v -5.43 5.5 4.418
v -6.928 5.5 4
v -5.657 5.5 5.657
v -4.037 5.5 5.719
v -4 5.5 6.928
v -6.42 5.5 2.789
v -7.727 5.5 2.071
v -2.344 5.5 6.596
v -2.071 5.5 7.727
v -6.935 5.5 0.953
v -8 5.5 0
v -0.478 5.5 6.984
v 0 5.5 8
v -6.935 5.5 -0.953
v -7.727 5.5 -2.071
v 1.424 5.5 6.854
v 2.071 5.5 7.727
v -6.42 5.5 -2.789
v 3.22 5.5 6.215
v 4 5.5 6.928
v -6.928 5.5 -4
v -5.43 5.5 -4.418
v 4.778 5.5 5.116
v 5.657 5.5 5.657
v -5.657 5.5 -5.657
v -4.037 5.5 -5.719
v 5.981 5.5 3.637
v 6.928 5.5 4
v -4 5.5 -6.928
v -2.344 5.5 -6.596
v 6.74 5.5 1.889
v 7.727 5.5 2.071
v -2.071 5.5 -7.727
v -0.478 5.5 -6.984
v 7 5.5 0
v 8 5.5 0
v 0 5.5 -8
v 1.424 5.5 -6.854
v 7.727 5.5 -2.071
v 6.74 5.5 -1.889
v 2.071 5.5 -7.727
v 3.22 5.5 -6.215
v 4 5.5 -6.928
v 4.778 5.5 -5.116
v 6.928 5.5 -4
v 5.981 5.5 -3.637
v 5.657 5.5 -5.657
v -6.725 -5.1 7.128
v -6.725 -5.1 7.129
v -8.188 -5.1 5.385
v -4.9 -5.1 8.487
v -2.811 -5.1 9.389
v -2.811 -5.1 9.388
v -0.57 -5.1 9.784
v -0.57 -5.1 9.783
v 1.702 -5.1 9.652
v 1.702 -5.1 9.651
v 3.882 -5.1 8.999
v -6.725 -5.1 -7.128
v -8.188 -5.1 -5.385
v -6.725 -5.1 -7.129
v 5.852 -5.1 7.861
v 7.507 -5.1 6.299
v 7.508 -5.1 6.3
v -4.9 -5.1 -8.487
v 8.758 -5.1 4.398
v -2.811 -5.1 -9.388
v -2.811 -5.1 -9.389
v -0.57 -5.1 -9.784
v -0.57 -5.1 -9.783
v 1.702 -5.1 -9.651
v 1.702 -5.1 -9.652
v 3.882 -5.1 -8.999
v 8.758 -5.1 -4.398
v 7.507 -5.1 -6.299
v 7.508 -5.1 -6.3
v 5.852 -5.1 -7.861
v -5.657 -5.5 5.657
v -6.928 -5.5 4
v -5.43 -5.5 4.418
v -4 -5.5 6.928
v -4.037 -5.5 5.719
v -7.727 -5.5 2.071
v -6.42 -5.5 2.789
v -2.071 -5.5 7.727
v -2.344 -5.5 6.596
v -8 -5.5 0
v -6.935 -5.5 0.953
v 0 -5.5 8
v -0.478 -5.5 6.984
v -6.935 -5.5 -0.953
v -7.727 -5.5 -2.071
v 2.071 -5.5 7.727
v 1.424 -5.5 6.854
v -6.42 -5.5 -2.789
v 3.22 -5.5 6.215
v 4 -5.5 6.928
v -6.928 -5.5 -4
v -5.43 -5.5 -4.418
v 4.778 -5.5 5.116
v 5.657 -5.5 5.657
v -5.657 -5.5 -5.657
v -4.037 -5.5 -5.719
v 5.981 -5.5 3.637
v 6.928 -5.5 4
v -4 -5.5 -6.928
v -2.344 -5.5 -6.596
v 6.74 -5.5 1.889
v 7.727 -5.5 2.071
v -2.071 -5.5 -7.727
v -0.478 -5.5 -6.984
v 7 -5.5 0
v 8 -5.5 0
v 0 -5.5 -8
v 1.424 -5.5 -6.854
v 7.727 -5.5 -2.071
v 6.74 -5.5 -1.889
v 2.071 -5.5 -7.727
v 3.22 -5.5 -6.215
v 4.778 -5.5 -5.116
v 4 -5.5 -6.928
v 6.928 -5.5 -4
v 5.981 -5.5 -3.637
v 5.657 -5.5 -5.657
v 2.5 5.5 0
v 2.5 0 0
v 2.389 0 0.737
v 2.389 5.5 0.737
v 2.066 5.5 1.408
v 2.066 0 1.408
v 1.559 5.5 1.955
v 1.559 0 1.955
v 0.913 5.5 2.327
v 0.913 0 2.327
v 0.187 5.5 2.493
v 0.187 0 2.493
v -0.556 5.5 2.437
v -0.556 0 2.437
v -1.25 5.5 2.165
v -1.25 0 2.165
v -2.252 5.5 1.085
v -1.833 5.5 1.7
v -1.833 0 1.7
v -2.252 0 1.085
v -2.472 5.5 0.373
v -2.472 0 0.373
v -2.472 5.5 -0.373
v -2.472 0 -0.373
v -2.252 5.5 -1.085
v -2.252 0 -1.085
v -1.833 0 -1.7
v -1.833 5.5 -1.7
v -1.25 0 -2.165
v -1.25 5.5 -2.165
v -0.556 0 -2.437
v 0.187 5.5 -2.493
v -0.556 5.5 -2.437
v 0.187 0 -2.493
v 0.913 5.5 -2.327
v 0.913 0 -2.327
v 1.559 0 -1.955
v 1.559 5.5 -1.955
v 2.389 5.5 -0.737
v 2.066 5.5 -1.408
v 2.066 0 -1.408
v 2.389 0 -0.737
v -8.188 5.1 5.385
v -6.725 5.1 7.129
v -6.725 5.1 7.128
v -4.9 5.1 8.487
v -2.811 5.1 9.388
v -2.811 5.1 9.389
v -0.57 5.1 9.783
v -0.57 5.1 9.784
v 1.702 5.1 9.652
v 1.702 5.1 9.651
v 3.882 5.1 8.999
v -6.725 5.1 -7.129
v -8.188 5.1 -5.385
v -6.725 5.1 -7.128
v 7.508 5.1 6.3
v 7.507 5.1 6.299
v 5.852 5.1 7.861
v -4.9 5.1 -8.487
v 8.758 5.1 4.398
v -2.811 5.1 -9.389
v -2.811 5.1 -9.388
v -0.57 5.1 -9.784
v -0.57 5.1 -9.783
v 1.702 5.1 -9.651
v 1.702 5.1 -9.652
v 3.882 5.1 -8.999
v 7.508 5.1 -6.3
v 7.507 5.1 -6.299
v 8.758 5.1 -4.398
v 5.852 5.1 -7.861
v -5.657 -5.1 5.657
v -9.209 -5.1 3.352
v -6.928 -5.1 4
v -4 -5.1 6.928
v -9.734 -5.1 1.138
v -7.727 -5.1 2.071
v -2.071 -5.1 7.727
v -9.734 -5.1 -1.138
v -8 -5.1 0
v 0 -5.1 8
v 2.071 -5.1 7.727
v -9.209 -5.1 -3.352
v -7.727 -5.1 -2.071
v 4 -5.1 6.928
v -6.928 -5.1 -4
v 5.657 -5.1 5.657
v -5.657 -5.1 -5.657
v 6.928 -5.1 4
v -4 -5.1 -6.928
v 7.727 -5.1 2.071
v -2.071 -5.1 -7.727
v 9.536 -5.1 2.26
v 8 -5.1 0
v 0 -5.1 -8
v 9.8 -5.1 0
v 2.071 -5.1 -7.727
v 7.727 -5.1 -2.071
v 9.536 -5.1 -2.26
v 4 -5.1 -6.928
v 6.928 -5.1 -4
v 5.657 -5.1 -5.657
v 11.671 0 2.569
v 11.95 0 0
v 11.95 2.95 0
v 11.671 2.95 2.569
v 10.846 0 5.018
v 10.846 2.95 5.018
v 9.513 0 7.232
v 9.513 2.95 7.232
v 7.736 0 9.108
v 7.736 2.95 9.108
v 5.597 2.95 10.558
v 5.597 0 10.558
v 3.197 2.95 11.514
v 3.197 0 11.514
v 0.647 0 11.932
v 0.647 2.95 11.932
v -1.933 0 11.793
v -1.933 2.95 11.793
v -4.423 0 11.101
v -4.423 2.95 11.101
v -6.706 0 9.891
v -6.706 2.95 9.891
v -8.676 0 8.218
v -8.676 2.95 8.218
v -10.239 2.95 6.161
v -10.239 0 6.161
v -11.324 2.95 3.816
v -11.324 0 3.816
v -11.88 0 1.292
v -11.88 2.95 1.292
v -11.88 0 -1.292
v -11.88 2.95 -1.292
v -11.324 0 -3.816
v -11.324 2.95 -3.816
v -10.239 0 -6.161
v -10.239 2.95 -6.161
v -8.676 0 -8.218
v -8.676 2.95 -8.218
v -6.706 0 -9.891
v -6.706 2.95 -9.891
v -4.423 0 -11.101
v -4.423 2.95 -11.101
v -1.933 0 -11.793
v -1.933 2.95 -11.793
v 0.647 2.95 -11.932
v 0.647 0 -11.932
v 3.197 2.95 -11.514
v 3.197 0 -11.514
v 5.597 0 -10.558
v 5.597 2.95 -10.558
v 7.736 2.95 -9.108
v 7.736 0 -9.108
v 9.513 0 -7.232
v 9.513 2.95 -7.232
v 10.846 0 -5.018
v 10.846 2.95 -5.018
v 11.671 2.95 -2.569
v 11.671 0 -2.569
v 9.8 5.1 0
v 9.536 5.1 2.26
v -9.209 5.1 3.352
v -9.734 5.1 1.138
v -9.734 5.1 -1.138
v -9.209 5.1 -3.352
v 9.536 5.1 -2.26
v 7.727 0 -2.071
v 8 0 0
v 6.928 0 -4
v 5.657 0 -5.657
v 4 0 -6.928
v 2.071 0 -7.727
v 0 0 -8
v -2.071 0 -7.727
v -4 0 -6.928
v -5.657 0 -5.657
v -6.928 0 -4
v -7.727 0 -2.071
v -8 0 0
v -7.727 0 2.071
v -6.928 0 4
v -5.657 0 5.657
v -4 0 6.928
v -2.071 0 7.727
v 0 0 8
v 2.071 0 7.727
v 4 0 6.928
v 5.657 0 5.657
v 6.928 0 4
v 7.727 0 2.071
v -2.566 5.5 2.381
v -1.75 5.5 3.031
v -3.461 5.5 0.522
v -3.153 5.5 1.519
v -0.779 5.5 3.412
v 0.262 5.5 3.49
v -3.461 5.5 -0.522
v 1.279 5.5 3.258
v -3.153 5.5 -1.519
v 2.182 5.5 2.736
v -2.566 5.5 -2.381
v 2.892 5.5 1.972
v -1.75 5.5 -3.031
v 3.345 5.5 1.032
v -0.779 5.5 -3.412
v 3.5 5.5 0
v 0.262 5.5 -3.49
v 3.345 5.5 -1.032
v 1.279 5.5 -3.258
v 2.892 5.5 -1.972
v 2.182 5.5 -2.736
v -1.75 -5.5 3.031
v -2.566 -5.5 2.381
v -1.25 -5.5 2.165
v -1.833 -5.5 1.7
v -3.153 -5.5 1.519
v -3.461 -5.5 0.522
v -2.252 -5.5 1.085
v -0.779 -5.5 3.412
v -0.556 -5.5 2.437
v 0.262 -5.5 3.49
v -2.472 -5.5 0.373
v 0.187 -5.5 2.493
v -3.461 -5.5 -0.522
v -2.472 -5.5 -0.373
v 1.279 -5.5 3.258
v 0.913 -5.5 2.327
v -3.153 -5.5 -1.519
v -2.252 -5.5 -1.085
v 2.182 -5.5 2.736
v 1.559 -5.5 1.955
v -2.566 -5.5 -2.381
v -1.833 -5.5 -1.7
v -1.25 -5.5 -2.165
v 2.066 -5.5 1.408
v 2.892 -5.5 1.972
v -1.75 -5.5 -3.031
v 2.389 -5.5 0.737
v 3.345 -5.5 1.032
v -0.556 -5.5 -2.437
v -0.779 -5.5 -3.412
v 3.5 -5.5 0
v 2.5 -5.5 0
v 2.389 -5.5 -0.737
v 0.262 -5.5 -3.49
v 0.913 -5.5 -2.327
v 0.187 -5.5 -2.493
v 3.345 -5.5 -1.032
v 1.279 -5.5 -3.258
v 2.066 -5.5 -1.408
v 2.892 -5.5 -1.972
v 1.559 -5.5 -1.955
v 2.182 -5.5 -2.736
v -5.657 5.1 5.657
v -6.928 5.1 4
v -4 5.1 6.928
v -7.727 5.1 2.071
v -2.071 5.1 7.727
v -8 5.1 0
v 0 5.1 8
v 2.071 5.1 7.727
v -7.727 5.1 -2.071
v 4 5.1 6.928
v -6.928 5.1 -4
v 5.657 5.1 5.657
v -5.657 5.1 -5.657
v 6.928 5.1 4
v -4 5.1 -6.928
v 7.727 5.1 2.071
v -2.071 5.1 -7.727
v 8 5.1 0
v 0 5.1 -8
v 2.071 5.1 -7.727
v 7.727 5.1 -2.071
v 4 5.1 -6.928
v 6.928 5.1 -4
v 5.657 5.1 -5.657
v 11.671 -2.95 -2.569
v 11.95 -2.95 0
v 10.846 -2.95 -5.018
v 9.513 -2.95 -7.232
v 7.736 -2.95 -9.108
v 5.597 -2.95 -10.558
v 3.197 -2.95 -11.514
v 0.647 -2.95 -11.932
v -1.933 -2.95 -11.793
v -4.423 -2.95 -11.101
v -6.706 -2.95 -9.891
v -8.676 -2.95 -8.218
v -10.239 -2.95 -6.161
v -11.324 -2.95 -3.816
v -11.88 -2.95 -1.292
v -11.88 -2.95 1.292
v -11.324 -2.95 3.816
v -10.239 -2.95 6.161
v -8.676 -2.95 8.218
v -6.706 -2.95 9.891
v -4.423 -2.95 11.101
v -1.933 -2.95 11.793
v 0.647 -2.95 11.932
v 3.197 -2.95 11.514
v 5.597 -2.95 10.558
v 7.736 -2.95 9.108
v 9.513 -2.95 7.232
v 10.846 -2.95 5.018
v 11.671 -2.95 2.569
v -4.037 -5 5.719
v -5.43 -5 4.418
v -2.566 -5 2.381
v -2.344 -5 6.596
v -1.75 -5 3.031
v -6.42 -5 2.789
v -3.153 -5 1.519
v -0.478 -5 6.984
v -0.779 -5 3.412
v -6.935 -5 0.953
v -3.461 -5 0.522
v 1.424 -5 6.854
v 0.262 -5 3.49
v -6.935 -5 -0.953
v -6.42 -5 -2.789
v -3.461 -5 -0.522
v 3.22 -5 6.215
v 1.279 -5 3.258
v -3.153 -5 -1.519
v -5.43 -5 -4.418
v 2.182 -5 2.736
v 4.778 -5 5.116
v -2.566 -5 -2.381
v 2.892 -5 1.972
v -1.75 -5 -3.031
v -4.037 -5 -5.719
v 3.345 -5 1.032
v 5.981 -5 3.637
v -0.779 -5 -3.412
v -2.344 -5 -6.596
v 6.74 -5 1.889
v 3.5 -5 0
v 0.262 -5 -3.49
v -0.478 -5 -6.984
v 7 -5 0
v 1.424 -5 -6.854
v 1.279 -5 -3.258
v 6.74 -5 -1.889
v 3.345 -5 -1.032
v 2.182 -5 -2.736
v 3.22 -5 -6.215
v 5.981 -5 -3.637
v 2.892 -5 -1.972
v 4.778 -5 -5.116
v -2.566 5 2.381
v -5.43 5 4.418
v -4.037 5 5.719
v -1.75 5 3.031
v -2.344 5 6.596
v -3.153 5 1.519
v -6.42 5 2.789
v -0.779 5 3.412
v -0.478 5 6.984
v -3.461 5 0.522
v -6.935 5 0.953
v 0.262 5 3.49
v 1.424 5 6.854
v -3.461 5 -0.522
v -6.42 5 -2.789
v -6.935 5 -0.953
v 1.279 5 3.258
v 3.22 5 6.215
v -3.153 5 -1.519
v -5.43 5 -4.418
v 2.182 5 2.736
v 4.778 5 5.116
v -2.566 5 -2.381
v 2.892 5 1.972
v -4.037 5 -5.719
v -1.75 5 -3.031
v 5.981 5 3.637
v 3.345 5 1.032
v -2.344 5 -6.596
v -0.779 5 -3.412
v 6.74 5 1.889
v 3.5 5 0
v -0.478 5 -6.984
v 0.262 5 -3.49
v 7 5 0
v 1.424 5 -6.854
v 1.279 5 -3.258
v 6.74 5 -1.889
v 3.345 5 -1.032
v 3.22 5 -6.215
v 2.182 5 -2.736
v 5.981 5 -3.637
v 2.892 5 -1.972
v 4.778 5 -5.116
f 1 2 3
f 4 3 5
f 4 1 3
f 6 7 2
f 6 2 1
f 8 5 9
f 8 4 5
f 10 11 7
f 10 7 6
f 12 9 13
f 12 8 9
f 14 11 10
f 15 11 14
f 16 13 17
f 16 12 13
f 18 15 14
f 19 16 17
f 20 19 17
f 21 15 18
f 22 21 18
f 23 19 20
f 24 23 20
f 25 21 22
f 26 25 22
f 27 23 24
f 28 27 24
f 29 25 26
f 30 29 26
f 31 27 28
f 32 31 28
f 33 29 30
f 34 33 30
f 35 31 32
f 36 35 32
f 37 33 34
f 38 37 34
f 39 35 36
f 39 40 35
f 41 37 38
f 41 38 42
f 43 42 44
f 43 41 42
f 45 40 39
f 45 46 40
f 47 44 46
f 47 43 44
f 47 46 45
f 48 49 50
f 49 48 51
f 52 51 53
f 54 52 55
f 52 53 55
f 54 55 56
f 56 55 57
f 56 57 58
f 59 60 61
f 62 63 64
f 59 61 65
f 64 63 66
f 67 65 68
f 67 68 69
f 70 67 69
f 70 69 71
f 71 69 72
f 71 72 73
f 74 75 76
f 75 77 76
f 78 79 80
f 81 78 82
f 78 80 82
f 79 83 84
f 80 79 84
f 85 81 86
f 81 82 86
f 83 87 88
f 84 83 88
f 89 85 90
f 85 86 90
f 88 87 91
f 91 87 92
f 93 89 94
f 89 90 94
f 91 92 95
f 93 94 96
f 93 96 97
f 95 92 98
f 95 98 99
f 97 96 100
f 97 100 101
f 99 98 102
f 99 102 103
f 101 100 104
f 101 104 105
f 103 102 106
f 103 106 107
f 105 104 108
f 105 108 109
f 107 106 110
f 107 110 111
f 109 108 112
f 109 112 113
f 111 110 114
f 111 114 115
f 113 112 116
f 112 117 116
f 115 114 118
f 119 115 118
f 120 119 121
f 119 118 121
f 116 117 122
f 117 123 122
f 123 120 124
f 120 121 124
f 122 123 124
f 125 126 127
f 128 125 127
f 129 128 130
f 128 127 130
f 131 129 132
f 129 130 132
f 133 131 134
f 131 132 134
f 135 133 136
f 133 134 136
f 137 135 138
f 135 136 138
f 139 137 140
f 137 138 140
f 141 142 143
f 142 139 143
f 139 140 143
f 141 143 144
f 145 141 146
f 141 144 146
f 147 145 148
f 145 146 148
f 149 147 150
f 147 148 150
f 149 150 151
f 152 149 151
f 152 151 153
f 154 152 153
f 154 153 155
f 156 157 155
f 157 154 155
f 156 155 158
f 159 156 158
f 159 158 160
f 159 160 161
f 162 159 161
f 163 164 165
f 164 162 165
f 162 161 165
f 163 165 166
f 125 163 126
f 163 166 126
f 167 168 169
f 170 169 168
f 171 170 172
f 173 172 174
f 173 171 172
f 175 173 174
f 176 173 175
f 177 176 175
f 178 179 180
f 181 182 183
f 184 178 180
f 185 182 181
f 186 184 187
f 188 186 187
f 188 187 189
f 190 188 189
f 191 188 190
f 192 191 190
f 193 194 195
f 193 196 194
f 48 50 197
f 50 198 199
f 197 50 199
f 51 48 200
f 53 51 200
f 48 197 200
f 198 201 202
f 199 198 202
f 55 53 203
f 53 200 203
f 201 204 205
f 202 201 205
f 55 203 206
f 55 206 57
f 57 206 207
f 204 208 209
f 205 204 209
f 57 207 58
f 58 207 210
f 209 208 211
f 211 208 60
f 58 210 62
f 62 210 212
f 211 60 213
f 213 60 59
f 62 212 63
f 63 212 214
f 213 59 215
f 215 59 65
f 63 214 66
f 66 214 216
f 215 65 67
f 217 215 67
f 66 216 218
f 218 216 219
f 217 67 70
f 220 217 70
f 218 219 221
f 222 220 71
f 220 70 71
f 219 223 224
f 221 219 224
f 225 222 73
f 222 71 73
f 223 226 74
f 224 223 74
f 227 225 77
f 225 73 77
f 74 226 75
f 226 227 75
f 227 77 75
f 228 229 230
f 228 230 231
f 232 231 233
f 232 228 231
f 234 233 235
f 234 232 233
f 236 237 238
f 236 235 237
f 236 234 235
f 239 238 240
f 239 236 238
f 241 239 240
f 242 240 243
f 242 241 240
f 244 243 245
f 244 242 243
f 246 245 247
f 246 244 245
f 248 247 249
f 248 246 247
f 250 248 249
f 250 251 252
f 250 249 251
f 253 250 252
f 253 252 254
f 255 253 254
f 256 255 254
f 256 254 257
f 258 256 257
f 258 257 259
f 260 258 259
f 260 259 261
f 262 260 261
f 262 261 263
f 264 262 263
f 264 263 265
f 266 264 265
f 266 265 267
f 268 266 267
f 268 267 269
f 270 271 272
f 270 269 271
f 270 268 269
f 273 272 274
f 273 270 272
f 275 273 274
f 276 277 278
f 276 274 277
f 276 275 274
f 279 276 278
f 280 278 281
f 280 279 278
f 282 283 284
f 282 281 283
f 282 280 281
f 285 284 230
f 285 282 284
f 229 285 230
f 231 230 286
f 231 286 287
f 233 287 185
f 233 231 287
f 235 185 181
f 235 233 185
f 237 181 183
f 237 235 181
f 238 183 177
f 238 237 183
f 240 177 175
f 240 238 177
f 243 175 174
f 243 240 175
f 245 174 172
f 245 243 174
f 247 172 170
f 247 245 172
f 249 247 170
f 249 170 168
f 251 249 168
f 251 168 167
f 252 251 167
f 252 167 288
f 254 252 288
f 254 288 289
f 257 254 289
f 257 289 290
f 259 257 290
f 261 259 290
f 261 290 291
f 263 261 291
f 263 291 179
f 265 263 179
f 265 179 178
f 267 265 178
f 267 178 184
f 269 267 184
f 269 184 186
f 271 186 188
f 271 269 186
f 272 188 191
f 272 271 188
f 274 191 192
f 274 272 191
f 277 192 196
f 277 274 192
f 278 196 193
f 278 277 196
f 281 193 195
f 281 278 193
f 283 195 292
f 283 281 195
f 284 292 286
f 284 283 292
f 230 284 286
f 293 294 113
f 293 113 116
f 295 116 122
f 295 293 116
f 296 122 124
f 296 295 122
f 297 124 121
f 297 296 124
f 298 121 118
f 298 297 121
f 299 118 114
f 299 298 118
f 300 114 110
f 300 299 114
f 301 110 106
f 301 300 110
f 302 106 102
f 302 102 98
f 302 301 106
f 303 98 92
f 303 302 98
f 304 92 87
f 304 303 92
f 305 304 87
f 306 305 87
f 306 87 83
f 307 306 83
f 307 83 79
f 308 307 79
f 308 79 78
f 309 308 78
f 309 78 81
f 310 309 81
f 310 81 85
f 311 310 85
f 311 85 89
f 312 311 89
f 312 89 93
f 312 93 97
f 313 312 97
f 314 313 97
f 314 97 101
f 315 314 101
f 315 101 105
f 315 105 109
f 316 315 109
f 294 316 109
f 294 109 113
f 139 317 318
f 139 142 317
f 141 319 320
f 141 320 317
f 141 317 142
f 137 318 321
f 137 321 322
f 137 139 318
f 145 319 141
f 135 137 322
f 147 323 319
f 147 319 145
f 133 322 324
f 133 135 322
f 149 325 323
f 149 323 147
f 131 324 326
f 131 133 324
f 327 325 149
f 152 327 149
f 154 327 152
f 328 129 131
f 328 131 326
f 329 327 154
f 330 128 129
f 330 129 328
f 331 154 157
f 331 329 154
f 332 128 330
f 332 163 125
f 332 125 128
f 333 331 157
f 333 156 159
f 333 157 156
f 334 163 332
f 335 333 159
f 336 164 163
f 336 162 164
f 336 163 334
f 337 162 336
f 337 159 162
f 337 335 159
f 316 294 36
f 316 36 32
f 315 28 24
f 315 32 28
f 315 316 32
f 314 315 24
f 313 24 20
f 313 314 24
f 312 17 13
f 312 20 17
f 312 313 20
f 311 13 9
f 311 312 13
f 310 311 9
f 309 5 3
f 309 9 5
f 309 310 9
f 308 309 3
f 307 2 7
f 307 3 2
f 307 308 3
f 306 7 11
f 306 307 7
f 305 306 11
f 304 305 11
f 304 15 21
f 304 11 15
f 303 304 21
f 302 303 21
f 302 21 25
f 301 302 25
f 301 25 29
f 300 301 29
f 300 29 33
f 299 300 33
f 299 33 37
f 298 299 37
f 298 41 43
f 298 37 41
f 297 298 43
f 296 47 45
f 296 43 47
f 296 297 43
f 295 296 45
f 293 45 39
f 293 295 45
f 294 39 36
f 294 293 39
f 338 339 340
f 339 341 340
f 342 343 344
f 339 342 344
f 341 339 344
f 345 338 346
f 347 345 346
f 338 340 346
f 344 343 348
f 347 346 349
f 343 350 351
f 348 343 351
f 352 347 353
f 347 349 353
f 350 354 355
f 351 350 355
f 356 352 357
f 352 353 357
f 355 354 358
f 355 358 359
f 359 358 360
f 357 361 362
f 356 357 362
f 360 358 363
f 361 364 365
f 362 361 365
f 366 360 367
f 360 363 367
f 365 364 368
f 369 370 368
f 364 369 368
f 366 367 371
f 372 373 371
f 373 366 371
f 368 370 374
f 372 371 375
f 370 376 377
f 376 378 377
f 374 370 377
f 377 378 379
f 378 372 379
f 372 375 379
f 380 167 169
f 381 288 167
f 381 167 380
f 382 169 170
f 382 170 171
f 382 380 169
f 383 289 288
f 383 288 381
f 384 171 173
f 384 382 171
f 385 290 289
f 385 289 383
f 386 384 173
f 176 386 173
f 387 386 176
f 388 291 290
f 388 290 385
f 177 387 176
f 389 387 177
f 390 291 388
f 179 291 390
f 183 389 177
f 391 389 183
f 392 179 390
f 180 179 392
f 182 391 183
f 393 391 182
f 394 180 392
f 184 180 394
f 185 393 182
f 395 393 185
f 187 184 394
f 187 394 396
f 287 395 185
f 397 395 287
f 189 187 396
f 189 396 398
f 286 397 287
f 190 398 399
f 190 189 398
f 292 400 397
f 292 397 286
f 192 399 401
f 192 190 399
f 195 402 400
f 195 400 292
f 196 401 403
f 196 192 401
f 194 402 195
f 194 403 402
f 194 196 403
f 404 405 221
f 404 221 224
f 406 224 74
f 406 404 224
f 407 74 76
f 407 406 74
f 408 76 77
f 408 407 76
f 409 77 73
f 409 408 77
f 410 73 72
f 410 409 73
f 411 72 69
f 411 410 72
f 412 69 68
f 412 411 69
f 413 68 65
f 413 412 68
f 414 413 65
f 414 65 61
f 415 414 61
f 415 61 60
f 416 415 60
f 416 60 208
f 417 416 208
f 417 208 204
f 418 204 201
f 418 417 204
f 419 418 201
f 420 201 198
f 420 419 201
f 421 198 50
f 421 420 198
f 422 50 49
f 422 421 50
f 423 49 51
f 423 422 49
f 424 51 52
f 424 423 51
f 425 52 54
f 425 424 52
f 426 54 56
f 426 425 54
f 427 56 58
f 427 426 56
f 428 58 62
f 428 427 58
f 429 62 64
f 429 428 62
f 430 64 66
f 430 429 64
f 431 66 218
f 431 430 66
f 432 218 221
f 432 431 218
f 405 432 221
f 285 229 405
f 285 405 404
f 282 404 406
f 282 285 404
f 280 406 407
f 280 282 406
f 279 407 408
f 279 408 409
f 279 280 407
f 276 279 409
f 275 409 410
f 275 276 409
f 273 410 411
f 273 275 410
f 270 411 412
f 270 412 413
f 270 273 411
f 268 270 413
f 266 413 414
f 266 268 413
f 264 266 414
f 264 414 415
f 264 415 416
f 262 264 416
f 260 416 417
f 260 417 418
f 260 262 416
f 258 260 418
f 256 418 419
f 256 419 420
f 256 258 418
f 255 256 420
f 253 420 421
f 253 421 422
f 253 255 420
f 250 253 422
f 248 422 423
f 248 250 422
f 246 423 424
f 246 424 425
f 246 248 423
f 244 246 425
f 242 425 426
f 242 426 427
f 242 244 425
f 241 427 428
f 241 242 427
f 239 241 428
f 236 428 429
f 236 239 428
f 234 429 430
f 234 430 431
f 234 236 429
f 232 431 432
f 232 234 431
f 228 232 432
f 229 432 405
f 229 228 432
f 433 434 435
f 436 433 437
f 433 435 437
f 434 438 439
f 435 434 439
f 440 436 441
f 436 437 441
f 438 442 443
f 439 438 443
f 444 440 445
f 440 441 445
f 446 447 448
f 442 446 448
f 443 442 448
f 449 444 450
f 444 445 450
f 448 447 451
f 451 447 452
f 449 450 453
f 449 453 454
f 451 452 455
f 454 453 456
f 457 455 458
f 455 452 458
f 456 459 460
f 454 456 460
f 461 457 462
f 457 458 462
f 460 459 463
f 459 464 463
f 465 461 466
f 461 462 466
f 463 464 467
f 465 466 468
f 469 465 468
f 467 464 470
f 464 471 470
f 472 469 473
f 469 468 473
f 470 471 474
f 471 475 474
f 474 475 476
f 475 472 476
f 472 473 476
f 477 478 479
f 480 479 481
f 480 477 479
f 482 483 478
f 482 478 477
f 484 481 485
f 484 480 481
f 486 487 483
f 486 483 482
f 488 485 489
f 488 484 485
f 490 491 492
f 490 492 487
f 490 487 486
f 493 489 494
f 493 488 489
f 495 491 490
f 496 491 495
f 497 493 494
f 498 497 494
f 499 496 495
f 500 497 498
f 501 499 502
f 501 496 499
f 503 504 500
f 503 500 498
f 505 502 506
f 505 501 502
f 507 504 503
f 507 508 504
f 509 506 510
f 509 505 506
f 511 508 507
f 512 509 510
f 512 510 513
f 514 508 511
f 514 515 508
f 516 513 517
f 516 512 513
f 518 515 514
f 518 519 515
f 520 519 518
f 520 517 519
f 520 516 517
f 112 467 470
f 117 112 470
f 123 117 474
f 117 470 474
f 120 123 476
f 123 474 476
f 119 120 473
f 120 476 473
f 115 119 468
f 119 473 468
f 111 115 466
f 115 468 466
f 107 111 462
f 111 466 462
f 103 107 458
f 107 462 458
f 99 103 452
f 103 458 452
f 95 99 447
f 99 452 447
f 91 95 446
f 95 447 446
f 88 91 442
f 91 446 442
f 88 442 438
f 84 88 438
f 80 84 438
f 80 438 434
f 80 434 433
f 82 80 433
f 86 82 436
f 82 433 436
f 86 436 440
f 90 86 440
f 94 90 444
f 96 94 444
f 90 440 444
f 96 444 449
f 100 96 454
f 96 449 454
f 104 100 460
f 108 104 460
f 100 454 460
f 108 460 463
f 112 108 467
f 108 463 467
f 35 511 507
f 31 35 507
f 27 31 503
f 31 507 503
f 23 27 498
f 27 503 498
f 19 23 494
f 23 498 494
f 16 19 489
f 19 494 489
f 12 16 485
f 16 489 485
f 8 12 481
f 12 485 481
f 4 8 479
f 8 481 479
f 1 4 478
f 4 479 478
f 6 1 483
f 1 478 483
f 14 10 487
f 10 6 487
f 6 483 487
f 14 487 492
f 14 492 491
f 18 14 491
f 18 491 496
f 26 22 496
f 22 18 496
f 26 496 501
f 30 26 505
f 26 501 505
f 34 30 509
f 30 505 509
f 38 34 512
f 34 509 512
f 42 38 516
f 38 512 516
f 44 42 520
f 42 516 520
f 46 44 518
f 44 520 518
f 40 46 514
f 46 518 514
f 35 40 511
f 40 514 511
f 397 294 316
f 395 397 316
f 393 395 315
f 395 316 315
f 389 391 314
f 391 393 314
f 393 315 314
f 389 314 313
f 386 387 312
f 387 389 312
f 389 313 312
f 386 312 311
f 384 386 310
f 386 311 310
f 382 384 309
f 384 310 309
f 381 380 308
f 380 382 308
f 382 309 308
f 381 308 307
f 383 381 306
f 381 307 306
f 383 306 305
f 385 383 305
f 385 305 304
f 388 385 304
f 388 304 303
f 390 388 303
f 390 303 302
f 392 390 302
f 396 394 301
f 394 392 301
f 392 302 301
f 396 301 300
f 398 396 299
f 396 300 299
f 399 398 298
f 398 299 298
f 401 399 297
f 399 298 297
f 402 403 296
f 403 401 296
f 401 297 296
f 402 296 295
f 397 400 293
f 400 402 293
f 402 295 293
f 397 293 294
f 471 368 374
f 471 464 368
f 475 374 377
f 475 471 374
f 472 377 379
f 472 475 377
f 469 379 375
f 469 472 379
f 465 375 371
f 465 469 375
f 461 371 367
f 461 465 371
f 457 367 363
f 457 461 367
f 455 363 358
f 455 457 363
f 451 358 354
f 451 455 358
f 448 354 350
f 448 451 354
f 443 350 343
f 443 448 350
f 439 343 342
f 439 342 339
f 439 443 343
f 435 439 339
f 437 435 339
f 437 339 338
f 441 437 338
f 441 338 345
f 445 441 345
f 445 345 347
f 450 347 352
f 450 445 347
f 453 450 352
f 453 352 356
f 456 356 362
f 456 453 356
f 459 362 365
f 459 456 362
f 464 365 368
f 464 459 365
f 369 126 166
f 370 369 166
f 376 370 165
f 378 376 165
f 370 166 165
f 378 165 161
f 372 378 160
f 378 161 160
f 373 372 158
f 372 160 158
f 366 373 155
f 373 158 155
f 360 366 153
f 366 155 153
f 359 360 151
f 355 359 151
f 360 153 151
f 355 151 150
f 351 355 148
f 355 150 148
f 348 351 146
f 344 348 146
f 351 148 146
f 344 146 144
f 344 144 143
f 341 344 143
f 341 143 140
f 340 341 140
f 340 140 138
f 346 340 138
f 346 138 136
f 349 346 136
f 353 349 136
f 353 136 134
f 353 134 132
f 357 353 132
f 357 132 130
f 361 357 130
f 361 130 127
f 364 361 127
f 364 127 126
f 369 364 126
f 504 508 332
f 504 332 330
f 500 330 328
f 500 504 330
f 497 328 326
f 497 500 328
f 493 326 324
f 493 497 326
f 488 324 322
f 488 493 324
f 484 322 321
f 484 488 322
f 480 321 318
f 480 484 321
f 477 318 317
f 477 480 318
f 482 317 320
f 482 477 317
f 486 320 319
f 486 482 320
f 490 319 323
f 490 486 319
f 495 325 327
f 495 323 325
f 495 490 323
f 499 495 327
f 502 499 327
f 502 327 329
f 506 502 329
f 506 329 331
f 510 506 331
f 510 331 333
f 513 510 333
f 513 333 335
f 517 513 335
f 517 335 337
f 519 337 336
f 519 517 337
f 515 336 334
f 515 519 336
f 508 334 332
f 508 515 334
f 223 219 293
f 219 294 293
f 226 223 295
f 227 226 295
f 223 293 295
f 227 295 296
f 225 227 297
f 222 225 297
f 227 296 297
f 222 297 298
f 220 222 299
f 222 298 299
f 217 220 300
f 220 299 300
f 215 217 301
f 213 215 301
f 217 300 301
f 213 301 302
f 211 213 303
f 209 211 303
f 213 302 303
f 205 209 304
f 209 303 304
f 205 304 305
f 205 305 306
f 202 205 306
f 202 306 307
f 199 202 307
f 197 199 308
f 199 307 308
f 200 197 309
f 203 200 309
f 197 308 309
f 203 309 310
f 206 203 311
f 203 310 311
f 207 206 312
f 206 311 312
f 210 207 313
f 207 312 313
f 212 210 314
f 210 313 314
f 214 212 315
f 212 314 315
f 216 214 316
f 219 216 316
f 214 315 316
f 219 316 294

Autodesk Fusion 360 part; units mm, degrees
sketch "Sketch1" plane through (0, 0, 0) normal (0, 1, 0) x (1, 0, 0)
  circle A0 centre (0, 0) radius 11.95
  circle A1 centre (0, 0) radius 9.8
  circle A2 centre (0, 0) radius 8
  circle A3 centre (0, 0) radius 2.5
  circle A4 centre (0, 0) radius 7
  circle A5 centre (0, 0) radius 3.5
  dimension "d1" = 23.9
  dimension "d2" = 19.6
  dimension "d3" = 16
  dimension "d4" = 5
  dimension "d13" = 14
  dimension "d14" = 7
extrude "Extrude3" add sketch "Sketch1" along normal mid plane 10.2 contours A0 | A1 makes body 1
chamfer "Chamfer1" distance 2.15 distance2 2.15 2 edges at (-11.1413, -5.1, -4.3213) (-11.1413, 5.1, 4.3213) measured on face at (10.5888, -5.1, 0.5937) measured on face at (10.5888, 5.1, 0.5937) on bodies 1
extrude "Extrude4" add sketch "Sketch1" along normal mid plane 11 separate body contours A2 | A5 makes body 2 at (7.9901, 3.6667, 0.3988) makes body 3 at (3.4956, 3.6667, 0.1745)
extrude "Extrude5" add sketch "Sketch1" along normal mid plane 10 contours A4 bodies 2 3
